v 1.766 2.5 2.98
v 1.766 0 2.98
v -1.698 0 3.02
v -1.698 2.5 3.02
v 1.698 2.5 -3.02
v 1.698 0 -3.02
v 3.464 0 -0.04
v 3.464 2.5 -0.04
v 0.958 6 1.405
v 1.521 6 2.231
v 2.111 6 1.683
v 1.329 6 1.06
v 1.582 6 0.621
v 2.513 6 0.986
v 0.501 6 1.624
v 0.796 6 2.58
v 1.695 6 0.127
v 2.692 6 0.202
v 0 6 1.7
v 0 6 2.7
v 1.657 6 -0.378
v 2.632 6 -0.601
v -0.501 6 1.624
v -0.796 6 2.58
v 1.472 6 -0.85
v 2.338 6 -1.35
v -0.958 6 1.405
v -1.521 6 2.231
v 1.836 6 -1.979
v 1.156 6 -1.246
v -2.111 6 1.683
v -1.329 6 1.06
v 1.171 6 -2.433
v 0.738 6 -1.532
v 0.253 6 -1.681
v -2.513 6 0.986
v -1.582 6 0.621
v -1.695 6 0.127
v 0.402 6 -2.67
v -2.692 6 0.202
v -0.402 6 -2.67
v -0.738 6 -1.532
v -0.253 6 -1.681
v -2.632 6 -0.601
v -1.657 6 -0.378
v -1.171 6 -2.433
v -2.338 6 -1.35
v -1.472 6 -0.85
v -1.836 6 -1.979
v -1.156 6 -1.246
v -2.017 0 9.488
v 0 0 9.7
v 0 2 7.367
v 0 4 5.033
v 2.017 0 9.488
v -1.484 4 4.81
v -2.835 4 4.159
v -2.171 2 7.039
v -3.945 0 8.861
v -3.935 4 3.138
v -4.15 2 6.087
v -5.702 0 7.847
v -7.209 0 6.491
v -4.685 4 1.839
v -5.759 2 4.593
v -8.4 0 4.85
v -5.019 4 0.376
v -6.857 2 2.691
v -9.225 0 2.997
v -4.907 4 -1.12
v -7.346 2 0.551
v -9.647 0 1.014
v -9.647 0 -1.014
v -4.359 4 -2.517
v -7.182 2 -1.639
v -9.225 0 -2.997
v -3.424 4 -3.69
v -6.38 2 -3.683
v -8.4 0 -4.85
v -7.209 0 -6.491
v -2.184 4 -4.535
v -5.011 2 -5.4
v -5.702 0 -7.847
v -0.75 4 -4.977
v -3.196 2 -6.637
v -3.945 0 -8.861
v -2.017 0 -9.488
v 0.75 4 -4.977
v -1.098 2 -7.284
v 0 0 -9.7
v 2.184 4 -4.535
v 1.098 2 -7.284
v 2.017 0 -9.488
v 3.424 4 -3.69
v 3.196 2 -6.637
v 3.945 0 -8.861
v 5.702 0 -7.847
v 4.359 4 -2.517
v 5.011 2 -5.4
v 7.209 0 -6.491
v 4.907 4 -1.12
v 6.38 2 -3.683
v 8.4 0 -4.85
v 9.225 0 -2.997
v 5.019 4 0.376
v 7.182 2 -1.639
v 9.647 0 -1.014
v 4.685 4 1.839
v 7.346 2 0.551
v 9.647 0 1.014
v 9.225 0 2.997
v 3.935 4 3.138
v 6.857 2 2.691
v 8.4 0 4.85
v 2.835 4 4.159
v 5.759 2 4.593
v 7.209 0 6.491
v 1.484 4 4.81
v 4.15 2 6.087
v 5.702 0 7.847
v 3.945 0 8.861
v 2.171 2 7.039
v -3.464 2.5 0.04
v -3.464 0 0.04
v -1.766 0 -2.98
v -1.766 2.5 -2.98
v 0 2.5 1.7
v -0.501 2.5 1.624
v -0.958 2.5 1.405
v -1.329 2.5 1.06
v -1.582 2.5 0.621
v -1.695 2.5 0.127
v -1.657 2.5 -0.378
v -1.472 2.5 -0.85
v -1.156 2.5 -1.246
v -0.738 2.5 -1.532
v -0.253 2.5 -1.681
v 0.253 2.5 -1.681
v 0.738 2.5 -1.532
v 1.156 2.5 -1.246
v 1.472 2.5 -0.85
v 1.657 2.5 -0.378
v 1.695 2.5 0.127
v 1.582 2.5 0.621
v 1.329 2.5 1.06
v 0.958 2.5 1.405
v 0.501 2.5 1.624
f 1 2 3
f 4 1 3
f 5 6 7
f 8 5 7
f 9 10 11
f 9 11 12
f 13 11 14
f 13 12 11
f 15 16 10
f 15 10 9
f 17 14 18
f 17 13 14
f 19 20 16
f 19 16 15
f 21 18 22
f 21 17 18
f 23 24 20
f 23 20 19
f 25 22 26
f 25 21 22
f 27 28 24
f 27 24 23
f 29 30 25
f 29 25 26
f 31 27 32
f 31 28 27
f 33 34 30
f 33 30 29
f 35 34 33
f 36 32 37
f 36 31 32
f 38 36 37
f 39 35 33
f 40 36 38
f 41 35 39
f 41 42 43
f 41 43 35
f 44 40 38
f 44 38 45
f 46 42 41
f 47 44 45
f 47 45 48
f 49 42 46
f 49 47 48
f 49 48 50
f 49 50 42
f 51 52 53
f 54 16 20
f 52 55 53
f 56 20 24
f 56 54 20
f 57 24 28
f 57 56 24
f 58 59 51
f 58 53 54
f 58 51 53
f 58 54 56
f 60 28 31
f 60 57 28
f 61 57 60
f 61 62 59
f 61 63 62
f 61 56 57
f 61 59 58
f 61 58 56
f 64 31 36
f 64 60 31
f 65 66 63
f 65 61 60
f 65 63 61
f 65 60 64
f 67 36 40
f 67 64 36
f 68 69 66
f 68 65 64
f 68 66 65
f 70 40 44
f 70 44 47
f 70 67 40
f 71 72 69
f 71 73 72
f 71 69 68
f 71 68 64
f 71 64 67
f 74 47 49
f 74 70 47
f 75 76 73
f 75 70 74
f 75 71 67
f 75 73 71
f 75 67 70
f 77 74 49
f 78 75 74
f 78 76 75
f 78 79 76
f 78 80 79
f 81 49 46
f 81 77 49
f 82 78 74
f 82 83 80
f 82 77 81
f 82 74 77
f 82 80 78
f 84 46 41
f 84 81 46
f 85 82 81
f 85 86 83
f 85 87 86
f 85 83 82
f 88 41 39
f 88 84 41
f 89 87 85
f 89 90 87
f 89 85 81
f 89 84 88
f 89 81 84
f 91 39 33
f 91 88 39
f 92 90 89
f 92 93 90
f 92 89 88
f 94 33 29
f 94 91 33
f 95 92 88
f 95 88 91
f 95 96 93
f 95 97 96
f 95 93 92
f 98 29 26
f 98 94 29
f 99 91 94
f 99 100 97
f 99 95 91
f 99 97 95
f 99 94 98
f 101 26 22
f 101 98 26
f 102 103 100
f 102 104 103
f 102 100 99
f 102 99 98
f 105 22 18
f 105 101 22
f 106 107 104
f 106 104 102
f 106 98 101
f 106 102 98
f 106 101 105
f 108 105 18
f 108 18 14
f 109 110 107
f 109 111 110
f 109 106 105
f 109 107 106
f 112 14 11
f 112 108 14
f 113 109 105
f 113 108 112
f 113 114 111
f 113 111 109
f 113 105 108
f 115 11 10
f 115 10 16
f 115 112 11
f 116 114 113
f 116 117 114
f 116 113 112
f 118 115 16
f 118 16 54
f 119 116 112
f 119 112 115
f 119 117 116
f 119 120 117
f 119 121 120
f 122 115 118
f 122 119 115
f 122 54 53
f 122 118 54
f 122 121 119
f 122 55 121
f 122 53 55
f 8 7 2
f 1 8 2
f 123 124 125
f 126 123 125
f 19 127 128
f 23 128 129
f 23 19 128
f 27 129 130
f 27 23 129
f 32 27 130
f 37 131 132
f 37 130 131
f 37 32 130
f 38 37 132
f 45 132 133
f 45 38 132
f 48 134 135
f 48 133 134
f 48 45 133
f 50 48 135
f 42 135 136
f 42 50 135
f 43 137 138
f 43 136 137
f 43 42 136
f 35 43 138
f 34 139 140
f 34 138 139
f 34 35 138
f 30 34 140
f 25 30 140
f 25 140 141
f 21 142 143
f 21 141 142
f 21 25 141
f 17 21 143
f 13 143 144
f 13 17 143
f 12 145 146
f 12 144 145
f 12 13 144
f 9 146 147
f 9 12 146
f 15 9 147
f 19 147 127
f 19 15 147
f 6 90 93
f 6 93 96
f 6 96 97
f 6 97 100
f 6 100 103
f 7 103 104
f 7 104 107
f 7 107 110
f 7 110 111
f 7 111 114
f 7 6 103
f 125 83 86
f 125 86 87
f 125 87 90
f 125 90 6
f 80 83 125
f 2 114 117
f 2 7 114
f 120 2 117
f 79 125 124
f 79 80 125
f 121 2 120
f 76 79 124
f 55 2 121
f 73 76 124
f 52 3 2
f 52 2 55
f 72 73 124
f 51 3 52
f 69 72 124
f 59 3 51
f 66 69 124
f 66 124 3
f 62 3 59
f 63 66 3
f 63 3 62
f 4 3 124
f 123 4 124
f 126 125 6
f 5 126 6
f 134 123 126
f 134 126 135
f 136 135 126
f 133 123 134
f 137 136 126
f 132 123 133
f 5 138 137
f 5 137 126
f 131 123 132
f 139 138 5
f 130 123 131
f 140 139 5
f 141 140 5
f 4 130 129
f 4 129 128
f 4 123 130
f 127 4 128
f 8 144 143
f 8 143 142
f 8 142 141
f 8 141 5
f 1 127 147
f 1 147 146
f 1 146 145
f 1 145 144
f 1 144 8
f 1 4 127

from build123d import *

# Parameters (mm, degrees)
CUT_EXTRUDE1_DEPTH = 2.5


with BuildPart() as part:
    # Sketch1 → Revolve1 (revolve)
    with BuildSketch(Plane.XY, mode=Mode.PRIVATE) as revolve1_sk:
        Polygon((-2.7, 6), (-9.7, 0), (-1.7, 0), (-1.7, 6), align=None)
    revolve(revolve1_sk.sketch.rotate(Axis((0, 11.326530612, 0), (0, -1, 0)), 270), axis=Axis((0, 11.326530612, 0), (0, -1, 0)))

    # Sketch2 → Cut-Extrude1 (cut)
    with BuildSketch(Plane.XZ):
        Polygon((1.697539741, -3.019662039), (3.463873907, -0.03971848), (1.766334166, 2.979943559), (-1.697539741, 3.019662039), (-3.463873907, 0.03971848), (-1.766334166, -2.979943559), align=None)
    extrude(amount=-CUT_EXTRUDE1_DEPTH, mode=Mode.SUBTRACT)


solid = part.part
